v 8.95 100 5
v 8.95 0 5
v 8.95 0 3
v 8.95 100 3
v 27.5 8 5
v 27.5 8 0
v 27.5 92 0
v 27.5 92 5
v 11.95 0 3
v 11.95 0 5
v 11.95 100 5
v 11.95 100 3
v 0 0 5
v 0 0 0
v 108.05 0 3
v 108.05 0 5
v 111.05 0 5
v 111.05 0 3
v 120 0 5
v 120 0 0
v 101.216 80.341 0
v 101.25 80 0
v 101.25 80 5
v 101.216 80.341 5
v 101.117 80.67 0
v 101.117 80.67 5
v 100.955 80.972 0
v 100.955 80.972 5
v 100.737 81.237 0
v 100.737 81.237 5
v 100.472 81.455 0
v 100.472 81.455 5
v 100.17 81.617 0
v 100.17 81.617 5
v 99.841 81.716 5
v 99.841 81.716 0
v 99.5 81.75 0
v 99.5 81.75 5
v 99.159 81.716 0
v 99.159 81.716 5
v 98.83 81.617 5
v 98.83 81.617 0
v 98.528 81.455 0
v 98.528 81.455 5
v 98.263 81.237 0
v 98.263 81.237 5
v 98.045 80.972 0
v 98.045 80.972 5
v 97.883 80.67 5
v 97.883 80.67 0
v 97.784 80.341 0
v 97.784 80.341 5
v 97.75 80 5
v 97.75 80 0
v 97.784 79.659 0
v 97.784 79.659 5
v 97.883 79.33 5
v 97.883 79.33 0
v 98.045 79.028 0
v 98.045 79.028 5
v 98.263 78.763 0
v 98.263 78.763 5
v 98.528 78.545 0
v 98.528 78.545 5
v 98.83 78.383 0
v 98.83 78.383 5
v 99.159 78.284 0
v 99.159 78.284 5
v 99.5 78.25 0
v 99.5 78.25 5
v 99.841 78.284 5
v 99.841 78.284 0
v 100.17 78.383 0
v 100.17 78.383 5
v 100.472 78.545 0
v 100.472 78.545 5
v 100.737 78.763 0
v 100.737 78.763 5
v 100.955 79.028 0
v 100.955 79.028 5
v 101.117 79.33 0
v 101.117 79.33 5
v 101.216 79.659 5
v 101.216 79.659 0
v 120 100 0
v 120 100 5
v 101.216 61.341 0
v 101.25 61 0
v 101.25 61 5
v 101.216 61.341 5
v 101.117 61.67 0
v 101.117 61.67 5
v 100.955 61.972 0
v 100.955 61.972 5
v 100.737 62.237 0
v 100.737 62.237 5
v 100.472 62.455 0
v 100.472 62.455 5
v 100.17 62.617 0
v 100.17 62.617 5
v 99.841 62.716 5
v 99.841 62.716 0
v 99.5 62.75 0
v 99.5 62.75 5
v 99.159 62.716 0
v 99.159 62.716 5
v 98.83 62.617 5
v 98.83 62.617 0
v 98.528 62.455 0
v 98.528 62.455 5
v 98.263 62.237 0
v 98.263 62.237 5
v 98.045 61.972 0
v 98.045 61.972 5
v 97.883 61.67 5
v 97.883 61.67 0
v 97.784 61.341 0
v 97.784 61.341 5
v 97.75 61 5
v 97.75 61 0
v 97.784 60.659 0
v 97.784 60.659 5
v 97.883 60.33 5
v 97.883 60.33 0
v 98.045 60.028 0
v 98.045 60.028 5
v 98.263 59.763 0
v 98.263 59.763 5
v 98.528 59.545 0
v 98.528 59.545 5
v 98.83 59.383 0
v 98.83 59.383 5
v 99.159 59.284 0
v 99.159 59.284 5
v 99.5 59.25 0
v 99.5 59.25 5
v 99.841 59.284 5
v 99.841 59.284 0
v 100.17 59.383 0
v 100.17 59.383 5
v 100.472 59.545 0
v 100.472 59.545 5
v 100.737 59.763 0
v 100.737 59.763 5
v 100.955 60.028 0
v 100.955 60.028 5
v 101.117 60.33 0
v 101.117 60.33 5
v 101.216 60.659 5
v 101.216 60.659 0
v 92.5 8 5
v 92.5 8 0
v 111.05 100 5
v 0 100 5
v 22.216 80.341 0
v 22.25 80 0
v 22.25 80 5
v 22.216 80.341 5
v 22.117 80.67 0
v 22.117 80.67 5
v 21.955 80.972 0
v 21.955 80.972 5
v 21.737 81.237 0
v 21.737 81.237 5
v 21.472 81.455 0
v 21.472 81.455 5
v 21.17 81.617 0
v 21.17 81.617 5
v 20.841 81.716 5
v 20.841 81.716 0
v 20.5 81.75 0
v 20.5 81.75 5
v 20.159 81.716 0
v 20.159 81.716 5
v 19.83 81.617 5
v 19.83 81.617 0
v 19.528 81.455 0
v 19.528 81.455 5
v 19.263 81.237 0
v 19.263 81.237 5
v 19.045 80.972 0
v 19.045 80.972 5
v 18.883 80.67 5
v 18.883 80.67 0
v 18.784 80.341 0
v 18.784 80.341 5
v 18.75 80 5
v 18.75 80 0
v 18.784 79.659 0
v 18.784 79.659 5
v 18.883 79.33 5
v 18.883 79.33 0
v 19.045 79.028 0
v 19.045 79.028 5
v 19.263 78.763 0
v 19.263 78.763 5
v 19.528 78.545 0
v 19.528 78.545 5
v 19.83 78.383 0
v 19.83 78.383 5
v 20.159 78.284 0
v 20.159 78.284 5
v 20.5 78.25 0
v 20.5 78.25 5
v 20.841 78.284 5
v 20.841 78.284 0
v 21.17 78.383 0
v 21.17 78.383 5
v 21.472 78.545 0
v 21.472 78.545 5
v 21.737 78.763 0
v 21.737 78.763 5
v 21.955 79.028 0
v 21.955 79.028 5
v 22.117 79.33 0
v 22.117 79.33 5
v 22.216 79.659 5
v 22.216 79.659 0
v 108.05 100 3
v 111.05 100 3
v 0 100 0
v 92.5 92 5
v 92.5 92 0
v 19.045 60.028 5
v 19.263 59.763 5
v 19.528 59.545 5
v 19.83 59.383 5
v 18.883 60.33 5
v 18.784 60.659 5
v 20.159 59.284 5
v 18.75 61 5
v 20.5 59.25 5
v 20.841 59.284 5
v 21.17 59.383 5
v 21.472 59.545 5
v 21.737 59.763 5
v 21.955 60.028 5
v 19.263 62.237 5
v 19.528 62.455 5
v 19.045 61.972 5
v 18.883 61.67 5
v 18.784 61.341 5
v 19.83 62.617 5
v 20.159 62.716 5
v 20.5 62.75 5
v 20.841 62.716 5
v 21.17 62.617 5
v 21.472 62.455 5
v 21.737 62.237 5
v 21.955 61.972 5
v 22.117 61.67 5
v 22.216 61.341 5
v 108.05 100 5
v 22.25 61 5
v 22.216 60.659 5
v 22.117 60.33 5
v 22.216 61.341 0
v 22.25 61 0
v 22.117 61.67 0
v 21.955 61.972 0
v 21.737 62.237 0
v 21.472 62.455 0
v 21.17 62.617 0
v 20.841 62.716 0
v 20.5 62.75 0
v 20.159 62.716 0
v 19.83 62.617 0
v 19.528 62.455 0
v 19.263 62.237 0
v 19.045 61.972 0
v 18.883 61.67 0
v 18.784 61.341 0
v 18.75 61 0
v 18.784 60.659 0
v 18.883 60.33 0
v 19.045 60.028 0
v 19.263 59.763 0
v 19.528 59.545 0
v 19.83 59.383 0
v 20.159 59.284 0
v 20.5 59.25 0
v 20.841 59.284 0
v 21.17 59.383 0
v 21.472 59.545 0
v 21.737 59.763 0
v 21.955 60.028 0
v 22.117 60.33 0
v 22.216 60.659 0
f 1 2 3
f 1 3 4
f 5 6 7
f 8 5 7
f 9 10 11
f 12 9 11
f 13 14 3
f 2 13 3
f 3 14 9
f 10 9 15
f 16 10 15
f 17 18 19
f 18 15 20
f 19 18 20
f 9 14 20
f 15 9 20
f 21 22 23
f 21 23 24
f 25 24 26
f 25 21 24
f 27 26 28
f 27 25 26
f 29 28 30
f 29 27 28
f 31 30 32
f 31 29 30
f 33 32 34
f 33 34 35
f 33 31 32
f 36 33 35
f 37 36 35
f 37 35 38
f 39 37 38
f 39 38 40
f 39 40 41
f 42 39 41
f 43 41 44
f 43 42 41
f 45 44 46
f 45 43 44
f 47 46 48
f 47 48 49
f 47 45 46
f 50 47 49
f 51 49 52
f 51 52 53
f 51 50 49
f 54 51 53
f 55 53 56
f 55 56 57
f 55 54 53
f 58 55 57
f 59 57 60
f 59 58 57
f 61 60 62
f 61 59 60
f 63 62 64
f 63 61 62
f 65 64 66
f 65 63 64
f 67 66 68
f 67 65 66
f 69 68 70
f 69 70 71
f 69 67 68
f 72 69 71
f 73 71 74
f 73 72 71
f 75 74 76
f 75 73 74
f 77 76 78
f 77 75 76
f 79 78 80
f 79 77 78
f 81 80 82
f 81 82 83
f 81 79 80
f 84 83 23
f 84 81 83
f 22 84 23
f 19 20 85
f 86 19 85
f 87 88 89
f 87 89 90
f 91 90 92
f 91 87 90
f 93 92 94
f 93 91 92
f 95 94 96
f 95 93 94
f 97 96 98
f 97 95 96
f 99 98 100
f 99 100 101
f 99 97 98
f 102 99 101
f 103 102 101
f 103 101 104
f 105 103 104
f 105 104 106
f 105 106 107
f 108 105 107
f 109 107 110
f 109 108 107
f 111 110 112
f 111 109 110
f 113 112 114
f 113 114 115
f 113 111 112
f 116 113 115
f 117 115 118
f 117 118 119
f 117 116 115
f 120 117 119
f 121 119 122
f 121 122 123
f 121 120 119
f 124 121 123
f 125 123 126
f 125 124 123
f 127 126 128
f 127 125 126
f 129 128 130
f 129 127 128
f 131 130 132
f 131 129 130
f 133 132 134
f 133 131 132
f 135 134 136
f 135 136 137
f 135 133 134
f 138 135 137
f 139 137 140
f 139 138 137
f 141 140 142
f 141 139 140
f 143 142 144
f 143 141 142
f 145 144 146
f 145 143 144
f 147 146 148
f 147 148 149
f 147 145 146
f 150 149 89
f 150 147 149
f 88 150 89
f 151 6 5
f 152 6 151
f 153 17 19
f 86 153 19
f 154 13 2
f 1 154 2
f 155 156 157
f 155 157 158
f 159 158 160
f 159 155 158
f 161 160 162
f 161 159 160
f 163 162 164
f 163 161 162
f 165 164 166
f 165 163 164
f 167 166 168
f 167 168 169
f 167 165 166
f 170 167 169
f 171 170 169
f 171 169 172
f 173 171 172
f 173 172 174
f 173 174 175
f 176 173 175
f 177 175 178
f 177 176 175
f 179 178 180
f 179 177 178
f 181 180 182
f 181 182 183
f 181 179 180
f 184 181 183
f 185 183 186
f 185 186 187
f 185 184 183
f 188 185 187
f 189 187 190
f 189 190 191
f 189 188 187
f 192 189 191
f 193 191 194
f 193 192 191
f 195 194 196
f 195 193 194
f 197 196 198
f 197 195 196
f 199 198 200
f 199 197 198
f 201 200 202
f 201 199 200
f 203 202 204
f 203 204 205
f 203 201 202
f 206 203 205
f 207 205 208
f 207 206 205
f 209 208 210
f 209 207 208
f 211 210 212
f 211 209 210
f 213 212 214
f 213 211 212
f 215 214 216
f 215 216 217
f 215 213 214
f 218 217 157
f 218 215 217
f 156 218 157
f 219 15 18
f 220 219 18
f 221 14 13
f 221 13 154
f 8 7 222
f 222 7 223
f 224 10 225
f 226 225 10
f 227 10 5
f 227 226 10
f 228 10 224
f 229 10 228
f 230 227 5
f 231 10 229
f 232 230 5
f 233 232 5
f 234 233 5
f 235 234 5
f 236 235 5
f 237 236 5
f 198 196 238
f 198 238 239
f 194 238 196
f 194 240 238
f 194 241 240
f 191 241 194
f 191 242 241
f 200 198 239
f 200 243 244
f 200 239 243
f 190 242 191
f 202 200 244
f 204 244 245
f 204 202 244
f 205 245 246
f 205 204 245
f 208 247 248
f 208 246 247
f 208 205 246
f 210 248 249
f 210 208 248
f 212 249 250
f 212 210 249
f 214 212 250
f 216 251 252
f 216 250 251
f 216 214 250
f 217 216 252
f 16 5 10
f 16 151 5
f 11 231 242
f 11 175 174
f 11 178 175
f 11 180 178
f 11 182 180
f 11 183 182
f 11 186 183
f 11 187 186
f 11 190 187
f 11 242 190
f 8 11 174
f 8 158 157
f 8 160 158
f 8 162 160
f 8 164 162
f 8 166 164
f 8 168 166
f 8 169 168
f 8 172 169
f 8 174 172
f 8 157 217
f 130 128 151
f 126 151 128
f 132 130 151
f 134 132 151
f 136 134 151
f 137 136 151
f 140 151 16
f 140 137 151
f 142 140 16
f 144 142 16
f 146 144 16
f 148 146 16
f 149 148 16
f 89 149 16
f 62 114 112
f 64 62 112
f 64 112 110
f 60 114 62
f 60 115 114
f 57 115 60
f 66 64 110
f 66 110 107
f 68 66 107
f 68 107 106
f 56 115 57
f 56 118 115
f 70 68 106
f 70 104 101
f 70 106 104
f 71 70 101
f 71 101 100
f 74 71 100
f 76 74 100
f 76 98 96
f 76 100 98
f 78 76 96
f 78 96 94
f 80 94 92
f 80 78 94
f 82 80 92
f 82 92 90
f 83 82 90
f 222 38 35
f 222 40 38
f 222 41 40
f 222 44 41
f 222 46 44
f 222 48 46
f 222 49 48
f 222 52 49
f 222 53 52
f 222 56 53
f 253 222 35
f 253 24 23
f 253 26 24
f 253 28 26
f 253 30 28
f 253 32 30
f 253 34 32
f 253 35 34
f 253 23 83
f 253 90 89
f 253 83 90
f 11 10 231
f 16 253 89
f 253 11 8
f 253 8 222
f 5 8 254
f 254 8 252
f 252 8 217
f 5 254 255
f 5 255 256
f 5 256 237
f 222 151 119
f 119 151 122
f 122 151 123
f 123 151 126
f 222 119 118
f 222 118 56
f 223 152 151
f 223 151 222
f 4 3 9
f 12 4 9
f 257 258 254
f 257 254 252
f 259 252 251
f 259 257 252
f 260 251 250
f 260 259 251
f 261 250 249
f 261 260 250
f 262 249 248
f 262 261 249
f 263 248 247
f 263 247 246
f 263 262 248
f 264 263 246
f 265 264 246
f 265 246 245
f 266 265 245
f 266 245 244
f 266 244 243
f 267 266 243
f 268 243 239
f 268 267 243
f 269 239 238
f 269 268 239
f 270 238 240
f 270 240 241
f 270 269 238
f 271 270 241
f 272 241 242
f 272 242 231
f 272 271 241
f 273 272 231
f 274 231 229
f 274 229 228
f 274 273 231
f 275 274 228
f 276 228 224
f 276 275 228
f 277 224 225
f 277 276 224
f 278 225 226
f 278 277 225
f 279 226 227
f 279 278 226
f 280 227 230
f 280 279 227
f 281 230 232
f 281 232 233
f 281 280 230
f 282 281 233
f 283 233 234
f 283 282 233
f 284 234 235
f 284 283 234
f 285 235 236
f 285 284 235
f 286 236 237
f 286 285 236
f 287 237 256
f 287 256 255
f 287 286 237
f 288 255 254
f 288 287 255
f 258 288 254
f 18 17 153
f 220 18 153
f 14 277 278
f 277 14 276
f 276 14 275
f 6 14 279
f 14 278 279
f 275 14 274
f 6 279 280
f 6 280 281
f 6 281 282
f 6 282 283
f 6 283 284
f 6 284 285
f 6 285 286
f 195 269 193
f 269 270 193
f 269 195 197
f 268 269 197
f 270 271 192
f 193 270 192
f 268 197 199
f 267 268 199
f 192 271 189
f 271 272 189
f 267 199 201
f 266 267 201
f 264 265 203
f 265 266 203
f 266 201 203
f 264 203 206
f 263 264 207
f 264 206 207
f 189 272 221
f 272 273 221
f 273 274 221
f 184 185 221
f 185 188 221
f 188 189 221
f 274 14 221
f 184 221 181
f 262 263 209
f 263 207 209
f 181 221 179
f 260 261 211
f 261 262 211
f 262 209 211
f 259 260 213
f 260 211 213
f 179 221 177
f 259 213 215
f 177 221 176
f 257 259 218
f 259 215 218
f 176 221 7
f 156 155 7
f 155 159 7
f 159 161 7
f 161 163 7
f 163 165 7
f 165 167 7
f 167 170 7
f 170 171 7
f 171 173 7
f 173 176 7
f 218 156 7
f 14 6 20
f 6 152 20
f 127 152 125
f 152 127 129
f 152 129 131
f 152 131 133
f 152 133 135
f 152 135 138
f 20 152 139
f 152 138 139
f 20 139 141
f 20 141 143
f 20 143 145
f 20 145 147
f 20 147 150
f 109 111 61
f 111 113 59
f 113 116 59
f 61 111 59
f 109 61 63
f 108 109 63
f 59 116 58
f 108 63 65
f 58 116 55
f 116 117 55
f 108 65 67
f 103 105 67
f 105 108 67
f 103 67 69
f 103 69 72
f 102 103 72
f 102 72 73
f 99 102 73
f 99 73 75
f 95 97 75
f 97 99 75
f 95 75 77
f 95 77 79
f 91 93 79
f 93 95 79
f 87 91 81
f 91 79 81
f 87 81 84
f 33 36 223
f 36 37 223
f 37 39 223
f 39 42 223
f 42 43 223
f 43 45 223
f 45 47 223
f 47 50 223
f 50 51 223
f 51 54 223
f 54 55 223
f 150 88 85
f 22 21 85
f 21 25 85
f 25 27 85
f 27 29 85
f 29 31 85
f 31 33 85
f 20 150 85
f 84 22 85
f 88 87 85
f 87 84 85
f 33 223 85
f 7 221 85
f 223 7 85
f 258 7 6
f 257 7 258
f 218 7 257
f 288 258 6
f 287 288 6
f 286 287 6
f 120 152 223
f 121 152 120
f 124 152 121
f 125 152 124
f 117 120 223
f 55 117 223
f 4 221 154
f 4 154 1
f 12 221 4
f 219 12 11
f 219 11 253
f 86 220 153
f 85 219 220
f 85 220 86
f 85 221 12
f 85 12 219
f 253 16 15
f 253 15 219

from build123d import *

# Parameters (mm, degrees)
SKETCH_1_W          = 120
SKETCH_1_H          = 100
SKETCH_1_R          = 1.75
SKETCH_1_W_2        = 65
SKETCH_1_H_2        = 84
EXTRUDE_1_DEPTH     = 5
SKETCH_2_W          = 3
SKETCH_2_H          = 100
CUT_EXTRUDE_1_DEPTH = 2


with BuildPart() as part:
    # 草图1 → 凸台-拉伸1 (new body)
    with BuildSketch(Plane.XY):
        with Locations((60, 50)):
            Rectangle(SKETCH_1_W, SKETCH_1_H)
        with Locations((20.5, 80)):
            Circle(SKETCH_1_R, mode=Mode.SUBTRACT)
        with Locations((20.5, 61)):
            Circle(SKETCH_1_R, mode=Mode.SUBTRACT)
        with Locations((99.5, 80)):
            Circle(SKETCH_1_R, mode=Mode.SUBTRACT)
        with Locations((99.5, 61)):
            Circle(SKETCH_1_R, mode=Mode.SUBTRACT)
        with Locations((60, 50)):
            Rectangle(SKETCH_1_W_2, SKETCH_1_H_2, mode=Mode.SUBTRACT)
    extrude(amount=EXTRUDE_1_DEPTH)

    # 草图2 → 切除-拉伸1 (cut)
    with BuildSketch(Plane.XY.offset(5)):
        with Locations((10.45, 50)):
            Rectangle(SKETCH_2_W, SKETCH_2_H)
        with Locations((109.55, 50)):
            Rectangle(SKETCH_2_W, SKETCH_2_H)
    extrude(amount=-CUT_EXTRUDE_1_DEPTH, mode=Mode.SUBTRACT)


solid = part.part
